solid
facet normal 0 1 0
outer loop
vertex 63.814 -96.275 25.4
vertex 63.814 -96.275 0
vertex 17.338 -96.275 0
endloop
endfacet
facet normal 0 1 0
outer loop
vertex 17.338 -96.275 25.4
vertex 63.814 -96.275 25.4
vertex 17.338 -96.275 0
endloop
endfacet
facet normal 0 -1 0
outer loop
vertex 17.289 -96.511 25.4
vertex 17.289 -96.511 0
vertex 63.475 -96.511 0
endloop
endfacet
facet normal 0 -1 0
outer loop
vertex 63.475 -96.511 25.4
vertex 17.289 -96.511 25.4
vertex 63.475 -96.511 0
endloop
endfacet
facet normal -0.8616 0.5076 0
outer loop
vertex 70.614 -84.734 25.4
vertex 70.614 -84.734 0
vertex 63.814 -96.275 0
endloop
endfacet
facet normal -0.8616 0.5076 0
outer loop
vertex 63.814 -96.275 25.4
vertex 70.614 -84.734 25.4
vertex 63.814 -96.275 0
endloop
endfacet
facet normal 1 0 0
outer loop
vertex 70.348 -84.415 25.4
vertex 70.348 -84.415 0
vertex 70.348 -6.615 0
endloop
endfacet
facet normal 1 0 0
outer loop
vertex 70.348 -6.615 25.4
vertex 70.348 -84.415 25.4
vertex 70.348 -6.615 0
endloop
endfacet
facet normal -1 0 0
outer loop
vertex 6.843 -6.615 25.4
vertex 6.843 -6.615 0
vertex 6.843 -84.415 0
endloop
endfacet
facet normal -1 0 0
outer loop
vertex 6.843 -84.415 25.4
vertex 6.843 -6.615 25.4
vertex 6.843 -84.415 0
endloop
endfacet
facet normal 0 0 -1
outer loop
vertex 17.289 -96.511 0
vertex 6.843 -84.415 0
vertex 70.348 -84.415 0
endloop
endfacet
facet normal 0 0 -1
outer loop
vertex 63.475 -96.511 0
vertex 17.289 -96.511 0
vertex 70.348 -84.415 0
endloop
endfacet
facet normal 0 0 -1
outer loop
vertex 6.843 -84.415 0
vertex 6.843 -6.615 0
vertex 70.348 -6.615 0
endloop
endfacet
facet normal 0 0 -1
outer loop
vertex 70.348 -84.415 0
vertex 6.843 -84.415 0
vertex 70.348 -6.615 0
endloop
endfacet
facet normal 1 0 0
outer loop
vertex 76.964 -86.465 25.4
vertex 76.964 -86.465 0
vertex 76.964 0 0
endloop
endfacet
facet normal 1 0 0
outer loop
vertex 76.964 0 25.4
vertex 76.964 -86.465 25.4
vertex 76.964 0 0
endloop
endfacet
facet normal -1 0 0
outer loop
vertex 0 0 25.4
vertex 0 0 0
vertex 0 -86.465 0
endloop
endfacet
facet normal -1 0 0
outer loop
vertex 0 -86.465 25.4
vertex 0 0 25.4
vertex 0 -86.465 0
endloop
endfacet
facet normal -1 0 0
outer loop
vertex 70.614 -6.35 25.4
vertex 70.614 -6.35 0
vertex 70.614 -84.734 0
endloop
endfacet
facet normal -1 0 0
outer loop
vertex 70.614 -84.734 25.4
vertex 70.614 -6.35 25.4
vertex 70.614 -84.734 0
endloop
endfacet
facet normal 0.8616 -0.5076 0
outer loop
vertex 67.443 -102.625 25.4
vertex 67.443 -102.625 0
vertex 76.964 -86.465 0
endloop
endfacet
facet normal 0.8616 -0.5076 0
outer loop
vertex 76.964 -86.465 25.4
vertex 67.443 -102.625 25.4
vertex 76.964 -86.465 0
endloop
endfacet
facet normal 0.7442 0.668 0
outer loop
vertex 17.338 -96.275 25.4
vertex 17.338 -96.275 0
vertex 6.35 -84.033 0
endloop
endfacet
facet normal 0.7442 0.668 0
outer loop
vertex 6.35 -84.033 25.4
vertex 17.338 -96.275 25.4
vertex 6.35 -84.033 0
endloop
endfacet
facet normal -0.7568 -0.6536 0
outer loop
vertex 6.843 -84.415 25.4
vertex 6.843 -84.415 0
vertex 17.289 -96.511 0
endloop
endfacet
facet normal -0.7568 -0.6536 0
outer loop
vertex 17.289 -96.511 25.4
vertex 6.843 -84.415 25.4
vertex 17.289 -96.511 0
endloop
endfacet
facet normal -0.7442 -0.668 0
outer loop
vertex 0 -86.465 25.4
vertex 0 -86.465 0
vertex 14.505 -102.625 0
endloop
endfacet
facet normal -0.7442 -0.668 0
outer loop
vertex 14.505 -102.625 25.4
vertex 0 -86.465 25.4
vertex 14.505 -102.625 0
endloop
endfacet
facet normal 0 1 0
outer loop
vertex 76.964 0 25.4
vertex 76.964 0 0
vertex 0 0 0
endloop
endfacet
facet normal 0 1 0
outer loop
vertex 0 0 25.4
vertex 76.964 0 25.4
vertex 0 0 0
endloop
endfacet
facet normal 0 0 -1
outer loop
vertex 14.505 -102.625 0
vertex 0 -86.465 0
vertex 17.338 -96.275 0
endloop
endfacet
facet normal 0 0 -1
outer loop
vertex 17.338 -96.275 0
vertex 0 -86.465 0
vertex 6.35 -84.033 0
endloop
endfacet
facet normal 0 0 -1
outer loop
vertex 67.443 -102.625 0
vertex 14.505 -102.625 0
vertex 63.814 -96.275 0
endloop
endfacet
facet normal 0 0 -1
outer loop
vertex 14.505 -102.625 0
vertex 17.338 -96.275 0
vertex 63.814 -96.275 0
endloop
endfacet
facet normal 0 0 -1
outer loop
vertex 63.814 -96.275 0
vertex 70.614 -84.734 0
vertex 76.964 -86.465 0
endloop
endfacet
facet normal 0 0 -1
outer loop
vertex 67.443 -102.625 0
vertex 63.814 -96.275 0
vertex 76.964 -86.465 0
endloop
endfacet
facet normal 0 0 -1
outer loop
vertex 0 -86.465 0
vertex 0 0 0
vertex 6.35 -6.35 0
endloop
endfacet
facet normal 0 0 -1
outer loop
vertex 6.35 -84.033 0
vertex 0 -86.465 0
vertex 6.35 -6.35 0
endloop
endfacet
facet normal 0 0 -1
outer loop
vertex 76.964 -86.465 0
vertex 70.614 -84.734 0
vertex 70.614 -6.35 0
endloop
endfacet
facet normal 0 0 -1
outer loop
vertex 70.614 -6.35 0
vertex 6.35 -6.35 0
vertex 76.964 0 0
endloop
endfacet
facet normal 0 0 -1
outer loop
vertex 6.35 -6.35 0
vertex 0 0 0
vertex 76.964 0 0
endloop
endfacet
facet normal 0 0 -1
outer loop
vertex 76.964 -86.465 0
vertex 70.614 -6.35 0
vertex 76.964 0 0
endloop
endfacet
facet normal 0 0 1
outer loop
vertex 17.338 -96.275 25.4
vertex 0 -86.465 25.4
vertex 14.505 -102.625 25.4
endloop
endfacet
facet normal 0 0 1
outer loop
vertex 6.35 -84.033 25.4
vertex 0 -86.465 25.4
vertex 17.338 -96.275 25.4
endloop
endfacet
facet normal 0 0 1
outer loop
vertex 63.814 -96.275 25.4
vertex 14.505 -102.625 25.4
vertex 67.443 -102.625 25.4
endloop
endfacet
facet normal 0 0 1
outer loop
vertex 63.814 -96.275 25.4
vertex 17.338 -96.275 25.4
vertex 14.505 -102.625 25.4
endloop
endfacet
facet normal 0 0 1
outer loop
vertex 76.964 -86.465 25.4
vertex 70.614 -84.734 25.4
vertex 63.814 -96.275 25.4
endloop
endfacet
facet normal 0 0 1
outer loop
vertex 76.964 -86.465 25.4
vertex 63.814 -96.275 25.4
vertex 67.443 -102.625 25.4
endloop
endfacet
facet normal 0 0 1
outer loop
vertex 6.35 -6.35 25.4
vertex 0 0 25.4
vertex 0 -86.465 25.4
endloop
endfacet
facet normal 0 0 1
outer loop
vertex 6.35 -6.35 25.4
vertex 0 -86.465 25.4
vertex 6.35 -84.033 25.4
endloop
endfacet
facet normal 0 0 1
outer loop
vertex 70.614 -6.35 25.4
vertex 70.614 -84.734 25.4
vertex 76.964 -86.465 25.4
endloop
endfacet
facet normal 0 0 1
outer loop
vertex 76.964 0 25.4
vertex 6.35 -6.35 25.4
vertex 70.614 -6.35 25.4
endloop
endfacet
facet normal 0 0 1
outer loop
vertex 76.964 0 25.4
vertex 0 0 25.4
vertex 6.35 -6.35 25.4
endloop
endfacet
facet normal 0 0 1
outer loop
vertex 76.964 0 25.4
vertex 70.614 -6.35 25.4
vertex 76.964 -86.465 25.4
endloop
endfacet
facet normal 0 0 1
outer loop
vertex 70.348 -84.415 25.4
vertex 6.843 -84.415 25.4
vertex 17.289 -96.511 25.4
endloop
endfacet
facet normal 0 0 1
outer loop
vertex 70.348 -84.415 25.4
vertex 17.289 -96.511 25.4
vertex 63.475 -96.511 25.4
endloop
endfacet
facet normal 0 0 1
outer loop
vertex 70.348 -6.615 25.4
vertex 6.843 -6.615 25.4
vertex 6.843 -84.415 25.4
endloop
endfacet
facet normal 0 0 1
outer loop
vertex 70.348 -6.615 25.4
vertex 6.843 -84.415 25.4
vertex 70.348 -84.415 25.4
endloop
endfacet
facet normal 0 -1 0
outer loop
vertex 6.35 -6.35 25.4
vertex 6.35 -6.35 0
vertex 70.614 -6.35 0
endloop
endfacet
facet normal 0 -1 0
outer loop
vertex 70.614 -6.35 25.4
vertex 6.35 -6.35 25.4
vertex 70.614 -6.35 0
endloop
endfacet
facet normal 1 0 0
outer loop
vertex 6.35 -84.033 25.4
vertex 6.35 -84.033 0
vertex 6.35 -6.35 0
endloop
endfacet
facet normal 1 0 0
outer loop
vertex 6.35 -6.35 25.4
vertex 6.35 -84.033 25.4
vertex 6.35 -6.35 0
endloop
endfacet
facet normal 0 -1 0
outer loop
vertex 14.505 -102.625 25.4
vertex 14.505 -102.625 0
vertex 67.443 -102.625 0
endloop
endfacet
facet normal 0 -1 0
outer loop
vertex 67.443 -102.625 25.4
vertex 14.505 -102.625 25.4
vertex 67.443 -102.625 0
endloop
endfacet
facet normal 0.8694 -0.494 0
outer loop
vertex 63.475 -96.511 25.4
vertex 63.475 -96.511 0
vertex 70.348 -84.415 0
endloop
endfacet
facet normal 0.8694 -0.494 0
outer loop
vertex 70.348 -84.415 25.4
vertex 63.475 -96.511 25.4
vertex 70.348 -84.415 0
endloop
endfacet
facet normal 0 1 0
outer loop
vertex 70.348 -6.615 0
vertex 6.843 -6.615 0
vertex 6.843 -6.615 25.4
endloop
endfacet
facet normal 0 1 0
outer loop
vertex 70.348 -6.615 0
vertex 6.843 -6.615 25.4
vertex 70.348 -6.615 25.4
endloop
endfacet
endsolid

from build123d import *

# Parameters (mm, degrees)
F1_DEPTH = 25.4
F2_W     = 63.505156
F2_H     = 0.274914
F3_DEPTH = 25.4


with BuildPart() as f1:
    # F0 (on Top) → F1 (new body)
    with BuildSketch(Plane.XY):
        Polygon((76.964237, 0), (0, 0), (0, -86.465143), (14.505068, -102.625065), (67.442708, -102.625065), (76.964237, -86.465143), align=None)
        Polygon((17.338182, -96.275065), (6.35, -84.033263), (6.35, -6.35), (70.614237, -6.35), (70.614237, -84.733525), (63.813888, -96.275065), align=None, mode=Mode.SUBTRACT)
    extrude(amount=F1_DEPTH)


with BuildPart() as f3:
    # F2 (on Top) → F3 (new body)
    with BuildSketch(Plane.XY):
        with Locations((38.595178, -6.752051)):
            Rectangle(F2_W, F2_H)
        Polygon((70.347756, -6.889508), (6.8426, -6.889508), (6.8426, -84.415279), (17.289333, -96.511498), (63.474901, -96.511498), (70.347756, -84.415279), align=None)
    extrude(amount=F3_DEPTH)


solid = Compound([f1.part, f3.part])
